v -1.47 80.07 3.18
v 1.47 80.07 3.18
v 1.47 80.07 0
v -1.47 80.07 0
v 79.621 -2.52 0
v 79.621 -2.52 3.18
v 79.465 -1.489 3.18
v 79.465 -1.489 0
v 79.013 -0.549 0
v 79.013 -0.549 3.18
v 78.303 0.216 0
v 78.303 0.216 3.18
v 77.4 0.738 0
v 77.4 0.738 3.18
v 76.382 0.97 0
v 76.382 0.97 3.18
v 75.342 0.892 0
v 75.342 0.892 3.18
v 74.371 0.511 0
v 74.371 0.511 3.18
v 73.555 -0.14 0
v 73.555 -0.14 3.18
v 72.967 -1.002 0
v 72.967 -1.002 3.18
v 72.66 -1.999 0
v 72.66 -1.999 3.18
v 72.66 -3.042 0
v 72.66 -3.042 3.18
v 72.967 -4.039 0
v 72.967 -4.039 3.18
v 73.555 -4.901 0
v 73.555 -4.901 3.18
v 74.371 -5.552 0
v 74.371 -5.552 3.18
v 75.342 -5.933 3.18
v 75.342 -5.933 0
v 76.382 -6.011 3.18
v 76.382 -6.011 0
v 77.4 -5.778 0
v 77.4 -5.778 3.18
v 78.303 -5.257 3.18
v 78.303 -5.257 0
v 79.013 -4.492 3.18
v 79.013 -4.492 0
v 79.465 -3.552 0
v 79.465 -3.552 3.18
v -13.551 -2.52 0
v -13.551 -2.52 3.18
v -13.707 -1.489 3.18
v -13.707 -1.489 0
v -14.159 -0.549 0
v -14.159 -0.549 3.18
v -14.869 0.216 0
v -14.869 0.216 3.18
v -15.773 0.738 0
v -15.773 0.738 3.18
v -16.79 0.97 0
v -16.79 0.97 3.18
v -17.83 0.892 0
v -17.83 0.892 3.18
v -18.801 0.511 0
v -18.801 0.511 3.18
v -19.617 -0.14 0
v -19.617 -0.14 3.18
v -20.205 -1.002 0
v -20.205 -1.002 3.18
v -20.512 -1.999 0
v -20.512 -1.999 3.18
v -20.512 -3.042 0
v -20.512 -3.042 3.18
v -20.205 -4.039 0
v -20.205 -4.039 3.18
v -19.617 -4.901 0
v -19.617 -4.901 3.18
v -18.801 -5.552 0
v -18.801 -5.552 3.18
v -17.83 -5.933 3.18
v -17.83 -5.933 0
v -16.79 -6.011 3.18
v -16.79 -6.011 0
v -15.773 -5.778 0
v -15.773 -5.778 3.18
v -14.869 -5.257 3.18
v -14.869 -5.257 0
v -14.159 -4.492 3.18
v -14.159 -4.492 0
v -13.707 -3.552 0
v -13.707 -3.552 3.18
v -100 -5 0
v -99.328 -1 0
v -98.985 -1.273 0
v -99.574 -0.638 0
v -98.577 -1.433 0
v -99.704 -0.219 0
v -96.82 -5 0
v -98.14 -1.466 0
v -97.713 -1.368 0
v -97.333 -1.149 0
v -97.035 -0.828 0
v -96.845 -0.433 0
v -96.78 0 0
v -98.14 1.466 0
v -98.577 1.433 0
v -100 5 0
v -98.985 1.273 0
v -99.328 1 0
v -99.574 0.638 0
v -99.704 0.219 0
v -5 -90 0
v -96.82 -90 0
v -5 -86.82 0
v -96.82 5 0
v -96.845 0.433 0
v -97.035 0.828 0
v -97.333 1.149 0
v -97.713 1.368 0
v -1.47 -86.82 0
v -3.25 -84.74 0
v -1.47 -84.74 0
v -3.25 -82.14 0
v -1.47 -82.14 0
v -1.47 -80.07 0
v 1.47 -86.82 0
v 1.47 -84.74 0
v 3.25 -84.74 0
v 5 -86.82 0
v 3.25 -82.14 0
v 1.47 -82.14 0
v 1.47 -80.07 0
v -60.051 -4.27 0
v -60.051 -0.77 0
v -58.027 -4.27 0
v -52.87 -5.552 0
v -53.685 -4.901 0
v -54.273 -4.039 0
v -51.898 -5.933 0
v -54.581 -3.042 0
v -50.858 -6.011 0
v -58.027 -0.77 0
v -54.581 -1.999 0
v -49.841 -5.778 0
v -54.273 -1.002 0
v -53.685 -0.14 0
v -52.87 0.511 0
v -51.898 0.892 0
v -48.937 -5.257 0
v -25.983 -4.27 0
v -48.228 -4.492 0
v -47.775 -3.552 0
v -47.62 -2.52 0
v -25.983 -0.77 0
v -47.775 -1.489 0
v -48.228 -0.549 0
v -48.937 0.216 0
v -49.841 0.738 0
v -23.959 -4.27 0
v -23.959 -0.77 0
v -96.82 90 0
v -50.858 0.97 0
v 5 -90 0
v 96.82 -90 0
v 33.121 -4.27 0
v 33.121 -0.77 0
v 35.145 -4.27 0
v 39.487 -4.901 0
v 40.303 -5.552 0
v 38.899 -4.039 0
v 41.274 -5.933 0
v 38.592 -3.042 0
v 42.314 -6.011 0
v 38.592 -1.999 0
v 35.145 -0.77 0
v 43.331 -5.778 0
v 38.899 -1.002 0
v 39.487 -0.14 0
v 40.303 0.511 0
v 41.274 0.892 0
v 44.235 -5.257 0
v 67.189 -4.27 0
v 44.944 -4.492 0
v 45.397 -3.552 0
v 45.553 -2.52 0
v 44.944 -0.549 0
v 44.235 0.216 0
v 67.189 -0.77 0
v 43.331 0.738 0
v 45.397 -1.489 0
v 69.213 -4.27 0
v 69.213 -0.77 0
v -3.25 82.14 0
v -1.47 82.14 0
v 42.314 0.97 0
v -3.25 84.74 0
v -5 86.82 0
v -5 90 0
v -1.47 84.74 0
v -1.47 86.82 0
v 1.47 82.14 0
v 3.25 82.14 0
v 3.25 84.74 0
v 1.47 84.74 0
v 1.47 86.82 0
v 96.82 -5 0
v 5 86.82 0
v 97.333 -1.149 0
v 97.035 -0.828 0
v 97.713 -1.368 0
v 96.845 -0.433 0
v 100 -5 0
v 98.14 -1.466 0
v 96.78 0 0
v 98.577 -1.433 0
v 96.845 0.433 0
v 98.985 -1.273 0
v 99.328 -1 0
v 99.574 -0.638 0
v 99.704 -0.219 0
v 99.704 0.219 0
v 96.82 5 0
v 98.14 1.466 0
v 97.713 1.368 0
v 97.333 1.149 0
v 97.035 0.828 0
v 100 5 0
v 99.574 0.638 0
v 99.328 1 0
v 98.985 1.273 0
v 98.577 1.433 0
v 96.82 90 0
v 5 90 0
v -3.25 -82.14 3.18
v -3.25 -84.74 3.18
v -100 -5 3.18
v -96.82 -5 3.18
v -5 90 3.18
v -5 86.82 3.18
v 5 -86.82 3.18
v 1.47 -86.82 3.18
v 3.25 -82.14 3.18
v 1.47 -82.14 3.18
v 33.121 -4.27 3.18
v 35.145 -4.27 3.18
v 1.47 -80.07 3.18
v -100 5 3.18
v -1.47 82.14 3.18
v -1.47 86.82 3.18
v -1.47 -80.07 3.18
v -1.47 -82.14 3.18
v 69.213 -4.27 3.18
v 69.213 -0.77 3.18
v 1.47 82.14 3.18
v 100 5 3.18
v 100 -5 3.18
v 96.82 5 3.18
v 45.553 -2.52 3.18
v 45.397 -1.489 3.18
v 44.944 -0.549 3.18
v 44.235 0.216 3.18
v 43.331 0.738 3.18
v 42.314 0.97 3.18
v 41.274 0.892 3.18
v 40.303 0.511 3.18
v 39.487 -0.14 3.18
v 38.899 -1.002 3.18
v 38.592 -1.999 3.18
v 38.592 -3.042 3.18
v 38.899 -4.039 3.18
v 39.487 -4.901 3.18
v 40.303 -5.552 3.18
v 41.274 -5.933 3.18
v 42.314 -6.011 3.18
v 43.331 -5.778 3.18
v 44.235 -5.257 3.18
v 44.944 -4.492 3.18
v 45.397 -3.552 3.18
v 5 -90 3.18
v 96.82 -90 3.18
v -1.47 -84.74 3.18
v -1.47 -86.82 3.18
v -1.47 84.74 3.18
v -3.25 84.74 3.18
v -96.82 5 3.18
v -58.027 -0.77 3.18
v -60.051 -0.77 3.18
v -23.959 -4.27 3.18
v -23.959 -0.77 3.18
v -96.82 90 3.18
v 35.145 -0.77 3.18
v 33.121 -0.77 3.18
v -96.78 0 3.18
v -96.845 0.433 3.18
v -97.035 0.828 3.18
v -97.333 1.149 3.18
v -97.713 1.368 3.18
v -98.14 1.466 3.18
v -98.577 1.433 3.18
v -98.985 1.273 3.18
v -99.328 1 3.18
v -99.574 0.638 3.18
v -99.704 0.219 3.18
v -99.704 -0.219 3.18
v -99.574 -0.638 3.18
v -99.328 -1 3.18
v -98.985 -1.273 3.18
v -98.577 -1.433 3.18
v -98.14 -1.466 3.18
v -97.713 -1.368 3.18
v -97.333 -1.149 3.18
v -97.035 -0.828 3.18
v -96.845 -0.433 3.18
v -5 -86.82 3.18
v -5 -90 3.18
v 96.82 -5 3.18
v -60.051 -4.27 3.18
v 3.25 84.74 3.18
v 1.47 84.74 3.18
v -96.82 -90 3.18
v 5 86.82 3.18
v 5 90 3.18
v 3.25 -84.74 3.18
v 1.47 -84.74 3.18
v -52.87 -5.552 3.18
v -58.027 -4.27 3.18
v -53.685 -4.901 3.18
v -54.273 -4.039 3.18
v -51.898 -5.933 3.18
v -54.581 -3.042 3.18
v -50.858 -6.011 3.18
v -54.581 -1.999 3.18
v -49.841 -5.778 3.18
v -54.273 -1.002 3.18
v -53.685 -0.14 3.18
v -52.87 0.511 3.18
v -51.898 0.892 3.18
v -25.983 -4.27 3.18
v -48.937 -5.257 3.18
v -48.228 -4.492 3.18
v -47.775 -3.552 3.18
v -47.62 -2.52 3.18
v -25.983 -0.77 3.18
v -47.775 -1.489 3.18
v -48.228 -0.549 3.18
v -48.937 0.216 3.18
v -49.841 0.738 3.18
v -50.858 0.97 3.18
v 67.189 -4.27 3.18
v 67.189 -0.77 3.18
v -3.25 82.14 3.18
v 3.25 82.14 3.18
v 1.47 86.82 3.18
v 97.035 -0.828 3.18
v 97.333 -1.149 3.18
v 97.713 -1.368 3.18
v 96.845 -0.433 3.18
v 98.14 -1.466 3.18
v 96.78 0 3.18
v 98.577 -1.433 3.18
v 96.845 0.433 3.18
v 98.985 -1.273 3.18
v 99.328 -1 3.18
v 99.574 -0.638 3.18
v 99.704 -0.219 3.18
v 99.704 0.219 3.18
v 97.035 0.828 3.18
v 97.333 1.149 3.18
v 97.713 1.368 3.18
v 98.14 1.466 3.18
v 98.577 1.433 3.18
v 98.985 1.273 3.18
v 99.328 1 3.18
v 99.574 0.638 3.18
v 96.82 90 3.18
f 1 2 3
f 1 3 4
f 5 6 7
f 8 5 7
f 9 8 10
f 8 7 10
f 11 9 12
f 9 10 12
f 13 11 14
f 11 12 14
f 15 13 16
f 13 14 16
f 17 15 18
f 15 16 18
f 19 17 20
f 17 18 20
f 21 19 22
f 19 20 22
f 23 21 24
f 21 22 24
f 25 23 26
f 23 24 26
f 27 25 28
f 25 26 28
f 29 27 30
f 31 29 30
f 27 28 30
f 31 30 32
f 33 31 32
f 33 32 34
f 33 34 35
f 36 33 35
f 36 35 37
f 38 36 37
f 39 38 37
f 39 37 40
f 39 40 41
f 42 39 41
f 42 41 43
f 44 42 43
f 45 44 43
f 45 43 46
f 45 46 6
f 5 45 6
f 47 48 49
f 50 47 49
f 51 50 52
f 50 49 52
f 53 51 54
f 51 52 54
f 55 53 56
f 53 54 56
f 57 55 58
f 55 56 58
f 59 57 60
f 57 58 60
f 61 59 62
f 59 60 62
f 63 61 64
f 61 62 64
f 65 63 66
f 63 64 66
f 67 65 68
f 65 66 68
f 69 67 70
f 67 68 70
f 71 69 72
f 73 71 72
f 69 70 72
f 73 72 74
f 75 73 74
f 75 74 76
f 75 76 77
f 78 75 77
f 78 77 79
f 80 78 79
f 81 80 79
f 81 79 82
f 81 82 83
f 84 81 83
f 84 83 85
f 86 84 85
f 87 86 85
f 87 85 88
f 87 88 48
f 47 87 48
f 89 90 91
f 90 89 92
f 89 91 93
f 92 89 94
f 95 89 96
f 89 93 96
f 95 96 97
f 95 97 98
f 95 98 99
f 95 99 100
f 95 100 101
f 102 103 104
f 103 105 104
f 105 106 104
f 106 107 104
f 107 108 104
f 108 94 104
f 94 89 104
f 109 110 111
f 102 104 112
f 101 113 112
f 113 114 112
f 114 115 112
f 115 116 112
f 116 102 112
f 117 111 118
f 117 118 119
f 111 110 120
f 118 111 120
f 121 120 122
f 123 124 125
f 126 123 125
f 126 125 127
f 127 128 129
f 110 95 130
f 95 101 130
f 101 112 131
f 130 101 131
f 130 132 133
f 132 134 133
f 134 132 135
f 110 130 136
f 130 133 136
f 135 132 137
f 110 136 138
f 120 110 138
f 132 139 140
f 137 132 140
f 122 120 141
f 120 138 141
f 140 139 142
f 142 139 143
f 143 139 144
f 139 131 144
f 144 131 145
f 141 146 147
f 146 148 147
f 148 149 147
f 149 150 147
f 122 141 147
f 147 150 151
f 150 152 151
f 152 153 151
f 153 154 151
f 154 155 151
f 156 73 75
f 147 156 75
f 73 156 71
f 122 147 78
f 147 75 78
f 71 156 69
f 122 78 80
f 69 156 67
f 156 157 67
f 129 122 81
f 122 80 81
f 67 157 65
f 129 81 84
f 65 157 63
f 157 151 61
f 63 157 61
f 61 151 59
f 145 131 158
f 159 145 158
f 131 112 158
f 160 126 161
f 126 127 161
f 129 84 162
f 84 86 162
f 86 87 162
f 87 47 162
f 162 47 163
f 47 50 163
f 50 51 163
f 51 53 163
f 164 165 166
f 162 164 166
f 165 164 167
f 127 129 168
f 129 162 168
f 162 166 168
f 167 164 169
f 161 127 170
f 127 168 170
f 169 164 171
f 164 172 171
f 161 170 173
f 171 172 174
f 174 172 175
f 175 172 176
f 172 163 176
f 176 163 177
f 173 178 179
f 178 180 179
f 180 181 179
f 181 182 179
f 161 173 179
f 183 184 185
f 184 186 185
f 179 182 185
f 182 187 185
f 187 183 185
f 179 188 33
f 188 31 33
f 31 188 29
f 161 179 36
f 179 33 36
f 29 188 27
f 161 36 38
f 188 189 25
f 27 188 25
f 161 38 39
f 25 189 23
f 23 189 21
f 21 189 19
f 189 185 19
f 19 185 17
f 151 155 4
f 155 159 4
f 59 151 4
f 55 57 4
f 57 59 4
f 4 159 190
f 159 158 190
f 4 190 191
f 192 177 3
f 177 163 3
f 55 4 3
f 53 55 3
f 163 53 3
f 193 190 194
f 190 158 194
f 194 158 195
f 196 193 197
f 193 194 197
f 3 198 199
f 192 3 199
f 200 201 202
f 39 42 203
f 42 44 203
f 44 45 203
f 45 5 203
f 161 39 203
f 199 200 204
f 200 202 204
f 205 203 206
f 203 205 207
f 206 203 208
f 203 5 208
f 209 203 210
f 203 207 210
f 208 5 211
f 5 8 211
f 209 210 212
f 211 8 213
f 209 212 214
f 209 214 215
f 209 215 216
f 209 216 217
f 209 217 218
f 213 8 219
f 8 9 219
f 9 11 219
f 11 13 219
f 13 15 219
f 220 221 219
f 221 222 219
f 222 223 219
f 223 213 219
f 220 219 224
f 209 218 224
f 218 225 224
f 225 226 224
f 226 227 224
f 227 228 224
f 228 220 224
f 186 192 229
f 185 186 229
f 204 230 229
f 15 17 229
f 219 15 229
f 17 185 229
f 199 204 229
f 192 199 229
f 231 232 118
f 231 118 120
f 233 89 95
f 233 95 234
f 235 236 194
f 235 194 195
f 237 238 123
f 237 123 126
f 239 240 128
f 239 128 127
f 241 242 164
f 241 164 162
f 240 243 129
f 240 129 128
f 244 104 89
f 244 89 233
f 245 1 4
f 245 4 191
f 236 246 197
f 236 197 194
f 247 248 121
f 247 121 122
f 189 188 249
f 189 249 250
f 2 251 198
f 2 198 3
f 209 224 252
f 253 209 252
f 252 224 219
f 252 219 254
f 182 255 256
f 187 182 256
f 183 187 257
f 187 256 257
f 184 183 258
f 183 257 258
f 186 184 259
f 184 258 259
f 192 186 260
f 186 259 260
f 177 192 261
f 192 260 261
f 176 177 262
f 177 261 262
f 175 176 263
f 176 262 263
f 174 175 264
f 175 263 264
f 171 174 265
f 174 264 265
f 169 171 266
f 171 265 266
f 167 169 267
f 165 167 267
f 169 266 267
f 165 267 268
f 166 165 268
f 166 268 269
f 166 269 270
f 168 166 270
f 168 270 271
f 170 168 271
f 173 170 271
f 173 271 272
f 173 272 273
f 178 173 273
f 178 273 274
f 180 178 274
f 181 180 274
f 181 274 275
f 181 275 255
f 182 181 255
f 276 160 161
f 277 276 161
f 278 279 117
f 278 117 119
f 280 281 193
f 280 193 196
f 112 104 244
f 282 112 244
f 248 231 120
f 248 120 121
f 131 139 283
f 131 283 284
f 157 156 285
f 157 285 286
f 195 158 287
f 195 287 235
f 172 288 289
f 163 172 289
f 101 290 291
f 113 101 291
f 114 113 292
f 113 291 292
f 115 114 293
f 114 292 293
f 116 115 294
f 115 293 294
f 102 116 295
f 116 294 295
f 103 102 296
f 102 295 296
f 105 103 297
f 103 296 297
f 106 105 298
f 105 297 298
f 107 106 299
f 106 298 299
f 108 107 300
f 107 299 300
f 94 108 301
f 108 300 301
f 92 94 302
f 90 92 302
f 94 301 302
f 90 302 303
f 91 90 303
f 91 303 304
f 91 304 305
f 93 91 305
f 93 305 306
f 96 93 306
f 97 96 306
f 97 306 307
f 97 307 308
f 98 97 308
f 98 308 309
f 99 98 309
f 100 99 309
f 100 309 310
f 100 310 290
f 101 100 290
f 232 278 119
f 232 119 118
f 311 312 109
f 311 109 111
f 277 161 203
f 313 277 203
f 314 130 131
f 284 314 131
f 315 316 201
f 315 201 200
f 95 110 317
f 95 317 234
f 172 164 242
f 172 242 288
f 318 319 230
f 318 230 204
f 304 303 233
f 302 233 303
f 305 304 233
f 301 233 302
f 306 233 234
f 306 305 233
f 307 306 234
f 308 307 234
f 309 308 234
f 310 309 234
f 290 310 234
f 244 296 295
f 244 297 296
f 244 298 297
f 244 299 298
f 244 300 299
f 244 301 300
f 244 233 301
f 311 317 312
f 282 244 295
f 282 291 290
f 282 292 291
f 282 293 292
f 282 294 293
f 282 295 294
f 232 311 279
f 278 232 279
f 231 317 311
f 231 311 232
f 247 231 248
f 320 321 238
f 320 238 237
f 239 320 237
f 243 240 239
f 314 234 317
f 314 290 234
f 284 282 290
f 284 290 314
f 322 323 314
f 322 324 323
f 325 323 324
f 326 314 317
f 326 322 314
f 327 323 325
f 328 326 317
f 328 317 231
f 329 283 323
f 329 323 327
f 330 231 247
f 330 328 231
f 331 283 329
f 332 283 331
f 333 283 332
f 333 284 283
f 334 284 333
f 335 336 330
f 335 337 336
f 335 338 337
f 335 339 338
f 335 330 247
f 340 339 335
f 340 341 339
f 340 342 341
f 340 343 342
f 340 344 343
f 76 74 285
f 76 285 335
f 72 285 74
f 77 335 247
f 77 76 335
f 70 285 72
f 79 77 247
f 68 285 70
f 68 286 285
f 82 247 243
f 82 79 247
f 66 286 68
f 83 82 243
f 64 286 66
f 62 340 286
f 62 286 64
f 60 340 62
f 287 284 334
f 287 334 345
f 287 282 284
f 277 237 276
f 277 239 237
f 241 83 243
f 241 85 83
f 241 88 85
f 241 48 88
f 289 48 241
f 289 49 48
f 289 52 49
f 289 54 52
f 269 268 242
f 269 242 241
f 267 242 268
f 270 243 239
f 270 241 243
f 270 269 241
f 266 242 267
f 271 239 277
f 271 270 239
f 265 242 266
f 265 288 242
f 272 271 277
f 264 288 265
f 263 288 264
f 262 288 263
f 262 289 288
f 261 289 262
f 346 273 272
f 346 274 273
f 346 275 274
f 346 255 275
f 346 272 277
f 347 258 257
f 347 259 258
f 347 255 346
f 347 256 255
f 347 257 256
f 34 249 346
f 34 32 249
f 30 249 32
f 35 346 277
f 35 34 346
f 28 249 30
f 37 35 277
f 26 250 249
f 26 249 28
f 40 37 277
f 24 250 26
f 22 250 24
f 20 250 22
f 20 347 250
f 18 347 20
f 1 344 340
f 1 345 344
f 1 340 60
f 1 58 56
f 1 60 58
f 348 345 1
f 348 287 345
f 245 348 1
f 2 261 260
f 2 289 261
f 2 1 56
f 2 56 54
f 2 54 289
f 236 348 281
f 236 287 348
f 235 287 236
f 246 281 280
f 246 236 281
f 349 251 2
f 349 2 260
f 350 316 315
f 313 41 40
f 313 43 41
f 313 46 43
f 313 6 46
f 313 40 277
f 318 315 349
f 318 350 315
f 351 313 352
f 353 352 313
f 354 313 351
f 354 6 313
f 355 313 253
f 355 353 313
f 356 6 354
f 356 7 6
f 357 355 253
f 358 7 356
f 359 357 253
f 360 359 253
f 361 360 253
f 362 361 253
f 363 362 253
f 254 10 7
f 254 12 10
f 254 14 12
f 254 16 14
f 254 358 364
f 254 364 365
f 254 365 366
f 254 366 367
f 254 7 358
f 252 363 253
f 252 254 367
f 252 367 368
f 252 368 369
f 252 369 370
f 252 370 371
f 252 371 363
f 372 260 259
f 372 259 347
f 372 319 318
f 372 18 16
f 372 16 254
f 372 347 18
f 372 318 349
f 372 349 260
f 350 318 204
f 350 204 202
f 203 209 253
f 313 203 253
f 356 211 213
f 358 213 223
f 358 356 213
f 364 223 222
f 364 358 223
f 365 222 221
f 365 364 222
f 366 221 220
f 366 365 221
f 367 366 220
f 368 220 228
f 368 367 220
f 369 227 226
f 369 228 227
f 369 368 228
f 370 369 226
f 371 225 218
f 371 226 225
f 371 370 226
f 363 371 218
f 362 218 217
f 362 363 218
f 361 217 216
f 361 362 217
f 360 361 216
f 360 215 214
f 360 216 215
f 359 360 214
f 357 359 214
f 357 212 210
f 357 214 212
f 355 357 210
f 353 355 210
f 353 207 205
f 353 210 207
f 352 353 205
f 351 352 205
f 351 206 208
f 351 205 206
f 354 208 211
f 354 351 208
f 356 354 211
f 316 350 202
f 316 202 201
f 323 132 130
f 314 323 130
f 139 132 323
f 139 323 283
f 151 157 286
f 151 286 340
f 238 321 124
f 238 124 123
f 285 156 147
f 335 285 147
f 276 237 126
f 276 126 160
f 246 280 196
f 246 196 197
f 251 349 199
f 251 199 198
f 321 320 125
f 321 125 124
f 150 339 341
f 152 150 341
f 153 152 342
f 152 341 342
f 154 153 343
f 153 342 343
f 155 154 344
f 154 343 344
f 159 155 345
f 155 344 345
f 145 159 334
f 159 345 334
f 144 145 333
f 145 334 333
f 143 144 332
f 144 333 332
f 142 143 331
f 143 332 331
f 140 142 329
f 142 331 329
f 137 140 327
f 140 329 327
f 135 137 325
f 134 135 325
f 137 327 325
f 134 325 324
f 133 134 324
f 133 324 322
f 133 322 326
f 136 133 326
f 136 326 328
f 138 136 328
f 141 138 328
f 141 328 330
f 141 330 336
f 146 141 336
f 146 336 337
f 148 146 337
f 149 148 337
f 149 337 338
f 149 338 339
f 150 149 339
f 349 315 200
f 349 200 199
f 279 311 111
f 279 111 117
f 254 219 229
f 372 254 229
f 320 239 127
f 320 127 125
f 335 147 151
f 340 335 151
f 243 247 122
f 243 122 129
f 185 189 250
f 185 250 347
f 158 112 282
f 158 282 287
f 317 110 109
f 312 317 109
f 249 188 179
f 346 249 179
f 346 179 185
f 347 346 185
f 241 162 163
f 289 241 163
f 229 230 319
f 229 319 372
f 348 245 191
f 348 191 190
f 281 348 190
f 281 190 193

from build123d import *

# Parameters (mm, degrees)
SKETCH2_W           = 193.64
SKETCH2_H           = 180
BOSS_EXTRUDE1_DEPTH = 3.18
CUT_EXTRUDE1_DEPTH  = 133.227927459
SKETCH4_W           = 3.18
SKETCH4_H           = 10
BOSS_EXTRUDE2_DEPTH = 3.18
SKETCH6_R           = 1.47
CUT_EXTRUDE2_DEPTH  = 135.573817662
SKETCH7_R           = 3.5
CUT_EXTRUDE3_DEPTH  = 135.573817662
SKETCH9_W           = 2.024123771
SKETCH9_H           = 3.5
SKETCH9_W_2         = 2.024123772
CUT_EXTRUDE4_DEPTH  = 135.573817662


with BuildPart() as part:
    # Sketch2 → Boss-Extrude1 (new body)
    with BuildSketch(Plane.XY):
        Rectangle(SKETCH2_W, SKETCH2_H)
    extrude(amount=BOSS_EXTRUDE1_DEPTH)

    # Sketch3 → Cut-Extrude1 (cut, through all)
    with BuildSketch(Plane.XY.offset(3.18)):
        Polygon((-5, 90), (5, 90), (5, 86.82), (1.47, 86.82), (1.47, 84.74), (3.25, 84.74), (3.25, 82.14), (1.47, 82.14), (1.47, 80.07), (-1.47, 80.07), (-1.47, 82.14), (-3.25, 82.14), (-3.25, 84.74), (-1.47, 84.74), (-1.47, 86.82), (-5, 86.82), align=None)
        Polygon((1.47, -86.82), (5, -86.82), (5, -90), (-5, -90), (-5, -86.82), (-1.47, -86.82), (-1.47, -84.74), (-3.25, -84.74), (-3.25, -82.14), (-1.47, -82.14), (-1.47, -80.07), (1.47, -80.07), (1.47, -82.14), (3.25, -82.14), (3.25, -84.74), (1.47, -84.74), align=None)
    extrude(amount=-CUT_EXTRUDE1_DEPTH, mode=Mode.SUBTRACT)

    # Sketch4 → Boss-Extrude2 (add)
    with BuildSketch(Plane.ZY.offset(96.82)):
        with Locations((1.59, 0)):
            Rectangle(SKETCH4_W, SKETCH4_H)
    boss_extrude2 = extrude(amount=BOSS_EXTRUDE2_DEPTH)

    # Sketch6 → Cut-Extrude2 (cut, through all)
    with BuildSketch(Plane.XY.offset(3.18)):
        with Locations((-98.25, 0)):
            Circle(SKETCH6_R)
    cut_extrude2 = extrude(amount=-CUT_EXTRUDE2_DEPTH, mode=Mode.SUBTRACT)

    # Mirror1: Boss-Extrude2 across plane
    add(boss_extrude2.mirror(Plane(origin=(0, 0, 0), x_dir=(0, 0, 1), z_dir=(1, 0, 0))))

    # Mirror2: Cut-Extrude2 across plane
    add(cut_extrude2.mirror(Plane(origin=(0, 0, 0), x_dir=(0, 0, 1), z_dir=(1, 0, 0))), mode=Mode.SUBTRACT)

    # Sketch7 → Cut-Extrude3 (cut, through all)
    with BuildSketch(Plane.XY.offset(3.18)):
        with Locations((-51.119653384, -2.520413941)):
            Circle(SKETCH7_R)
        with Locations((-17.051323135, -2.520413941)):
            Circle(SKETCH7_R)
        with Locations((42.052504626, -2.520413941)):
            Circle(SKETCH7_R)
        with Locations((76.120834875, -2.520413941)):
            Circle(SKETCH7_R)
    extrude(amount=-CUT_EXTRUDE3_DEPTH, mode=Mode.SUBTRACT)

    # Sketch9 → Cut-Extrude4 (cut, through all)
    with BuildSketch(Plane(origin=(0, 0, 0), x_dir=(-1, 0, 0), z_dir=(0, 0, -1))):
        with Locations((59.039301131, -2.520413941)):
            Rectangle(SKETCH9_W, SKETCH9_H)
        with Locations((24.970970881, -2.520413941)):
            Rectangle(SKETCH9_W_2, SKETCH9_H)
        with Locations((-34.13285688, -2.520413941)):
            Rectangle(SKETCH9_W_2, SKETCH9_H)
        with Locations((-68.201187129, -2.520413941)):
            Rectangle(SKETCH9_W_2, SKETCH9_H)
    extrude(amount=-CUT_EXTRUDE4_DEPTH, mode=Mode.SUBTRACT)


solid = part.part
